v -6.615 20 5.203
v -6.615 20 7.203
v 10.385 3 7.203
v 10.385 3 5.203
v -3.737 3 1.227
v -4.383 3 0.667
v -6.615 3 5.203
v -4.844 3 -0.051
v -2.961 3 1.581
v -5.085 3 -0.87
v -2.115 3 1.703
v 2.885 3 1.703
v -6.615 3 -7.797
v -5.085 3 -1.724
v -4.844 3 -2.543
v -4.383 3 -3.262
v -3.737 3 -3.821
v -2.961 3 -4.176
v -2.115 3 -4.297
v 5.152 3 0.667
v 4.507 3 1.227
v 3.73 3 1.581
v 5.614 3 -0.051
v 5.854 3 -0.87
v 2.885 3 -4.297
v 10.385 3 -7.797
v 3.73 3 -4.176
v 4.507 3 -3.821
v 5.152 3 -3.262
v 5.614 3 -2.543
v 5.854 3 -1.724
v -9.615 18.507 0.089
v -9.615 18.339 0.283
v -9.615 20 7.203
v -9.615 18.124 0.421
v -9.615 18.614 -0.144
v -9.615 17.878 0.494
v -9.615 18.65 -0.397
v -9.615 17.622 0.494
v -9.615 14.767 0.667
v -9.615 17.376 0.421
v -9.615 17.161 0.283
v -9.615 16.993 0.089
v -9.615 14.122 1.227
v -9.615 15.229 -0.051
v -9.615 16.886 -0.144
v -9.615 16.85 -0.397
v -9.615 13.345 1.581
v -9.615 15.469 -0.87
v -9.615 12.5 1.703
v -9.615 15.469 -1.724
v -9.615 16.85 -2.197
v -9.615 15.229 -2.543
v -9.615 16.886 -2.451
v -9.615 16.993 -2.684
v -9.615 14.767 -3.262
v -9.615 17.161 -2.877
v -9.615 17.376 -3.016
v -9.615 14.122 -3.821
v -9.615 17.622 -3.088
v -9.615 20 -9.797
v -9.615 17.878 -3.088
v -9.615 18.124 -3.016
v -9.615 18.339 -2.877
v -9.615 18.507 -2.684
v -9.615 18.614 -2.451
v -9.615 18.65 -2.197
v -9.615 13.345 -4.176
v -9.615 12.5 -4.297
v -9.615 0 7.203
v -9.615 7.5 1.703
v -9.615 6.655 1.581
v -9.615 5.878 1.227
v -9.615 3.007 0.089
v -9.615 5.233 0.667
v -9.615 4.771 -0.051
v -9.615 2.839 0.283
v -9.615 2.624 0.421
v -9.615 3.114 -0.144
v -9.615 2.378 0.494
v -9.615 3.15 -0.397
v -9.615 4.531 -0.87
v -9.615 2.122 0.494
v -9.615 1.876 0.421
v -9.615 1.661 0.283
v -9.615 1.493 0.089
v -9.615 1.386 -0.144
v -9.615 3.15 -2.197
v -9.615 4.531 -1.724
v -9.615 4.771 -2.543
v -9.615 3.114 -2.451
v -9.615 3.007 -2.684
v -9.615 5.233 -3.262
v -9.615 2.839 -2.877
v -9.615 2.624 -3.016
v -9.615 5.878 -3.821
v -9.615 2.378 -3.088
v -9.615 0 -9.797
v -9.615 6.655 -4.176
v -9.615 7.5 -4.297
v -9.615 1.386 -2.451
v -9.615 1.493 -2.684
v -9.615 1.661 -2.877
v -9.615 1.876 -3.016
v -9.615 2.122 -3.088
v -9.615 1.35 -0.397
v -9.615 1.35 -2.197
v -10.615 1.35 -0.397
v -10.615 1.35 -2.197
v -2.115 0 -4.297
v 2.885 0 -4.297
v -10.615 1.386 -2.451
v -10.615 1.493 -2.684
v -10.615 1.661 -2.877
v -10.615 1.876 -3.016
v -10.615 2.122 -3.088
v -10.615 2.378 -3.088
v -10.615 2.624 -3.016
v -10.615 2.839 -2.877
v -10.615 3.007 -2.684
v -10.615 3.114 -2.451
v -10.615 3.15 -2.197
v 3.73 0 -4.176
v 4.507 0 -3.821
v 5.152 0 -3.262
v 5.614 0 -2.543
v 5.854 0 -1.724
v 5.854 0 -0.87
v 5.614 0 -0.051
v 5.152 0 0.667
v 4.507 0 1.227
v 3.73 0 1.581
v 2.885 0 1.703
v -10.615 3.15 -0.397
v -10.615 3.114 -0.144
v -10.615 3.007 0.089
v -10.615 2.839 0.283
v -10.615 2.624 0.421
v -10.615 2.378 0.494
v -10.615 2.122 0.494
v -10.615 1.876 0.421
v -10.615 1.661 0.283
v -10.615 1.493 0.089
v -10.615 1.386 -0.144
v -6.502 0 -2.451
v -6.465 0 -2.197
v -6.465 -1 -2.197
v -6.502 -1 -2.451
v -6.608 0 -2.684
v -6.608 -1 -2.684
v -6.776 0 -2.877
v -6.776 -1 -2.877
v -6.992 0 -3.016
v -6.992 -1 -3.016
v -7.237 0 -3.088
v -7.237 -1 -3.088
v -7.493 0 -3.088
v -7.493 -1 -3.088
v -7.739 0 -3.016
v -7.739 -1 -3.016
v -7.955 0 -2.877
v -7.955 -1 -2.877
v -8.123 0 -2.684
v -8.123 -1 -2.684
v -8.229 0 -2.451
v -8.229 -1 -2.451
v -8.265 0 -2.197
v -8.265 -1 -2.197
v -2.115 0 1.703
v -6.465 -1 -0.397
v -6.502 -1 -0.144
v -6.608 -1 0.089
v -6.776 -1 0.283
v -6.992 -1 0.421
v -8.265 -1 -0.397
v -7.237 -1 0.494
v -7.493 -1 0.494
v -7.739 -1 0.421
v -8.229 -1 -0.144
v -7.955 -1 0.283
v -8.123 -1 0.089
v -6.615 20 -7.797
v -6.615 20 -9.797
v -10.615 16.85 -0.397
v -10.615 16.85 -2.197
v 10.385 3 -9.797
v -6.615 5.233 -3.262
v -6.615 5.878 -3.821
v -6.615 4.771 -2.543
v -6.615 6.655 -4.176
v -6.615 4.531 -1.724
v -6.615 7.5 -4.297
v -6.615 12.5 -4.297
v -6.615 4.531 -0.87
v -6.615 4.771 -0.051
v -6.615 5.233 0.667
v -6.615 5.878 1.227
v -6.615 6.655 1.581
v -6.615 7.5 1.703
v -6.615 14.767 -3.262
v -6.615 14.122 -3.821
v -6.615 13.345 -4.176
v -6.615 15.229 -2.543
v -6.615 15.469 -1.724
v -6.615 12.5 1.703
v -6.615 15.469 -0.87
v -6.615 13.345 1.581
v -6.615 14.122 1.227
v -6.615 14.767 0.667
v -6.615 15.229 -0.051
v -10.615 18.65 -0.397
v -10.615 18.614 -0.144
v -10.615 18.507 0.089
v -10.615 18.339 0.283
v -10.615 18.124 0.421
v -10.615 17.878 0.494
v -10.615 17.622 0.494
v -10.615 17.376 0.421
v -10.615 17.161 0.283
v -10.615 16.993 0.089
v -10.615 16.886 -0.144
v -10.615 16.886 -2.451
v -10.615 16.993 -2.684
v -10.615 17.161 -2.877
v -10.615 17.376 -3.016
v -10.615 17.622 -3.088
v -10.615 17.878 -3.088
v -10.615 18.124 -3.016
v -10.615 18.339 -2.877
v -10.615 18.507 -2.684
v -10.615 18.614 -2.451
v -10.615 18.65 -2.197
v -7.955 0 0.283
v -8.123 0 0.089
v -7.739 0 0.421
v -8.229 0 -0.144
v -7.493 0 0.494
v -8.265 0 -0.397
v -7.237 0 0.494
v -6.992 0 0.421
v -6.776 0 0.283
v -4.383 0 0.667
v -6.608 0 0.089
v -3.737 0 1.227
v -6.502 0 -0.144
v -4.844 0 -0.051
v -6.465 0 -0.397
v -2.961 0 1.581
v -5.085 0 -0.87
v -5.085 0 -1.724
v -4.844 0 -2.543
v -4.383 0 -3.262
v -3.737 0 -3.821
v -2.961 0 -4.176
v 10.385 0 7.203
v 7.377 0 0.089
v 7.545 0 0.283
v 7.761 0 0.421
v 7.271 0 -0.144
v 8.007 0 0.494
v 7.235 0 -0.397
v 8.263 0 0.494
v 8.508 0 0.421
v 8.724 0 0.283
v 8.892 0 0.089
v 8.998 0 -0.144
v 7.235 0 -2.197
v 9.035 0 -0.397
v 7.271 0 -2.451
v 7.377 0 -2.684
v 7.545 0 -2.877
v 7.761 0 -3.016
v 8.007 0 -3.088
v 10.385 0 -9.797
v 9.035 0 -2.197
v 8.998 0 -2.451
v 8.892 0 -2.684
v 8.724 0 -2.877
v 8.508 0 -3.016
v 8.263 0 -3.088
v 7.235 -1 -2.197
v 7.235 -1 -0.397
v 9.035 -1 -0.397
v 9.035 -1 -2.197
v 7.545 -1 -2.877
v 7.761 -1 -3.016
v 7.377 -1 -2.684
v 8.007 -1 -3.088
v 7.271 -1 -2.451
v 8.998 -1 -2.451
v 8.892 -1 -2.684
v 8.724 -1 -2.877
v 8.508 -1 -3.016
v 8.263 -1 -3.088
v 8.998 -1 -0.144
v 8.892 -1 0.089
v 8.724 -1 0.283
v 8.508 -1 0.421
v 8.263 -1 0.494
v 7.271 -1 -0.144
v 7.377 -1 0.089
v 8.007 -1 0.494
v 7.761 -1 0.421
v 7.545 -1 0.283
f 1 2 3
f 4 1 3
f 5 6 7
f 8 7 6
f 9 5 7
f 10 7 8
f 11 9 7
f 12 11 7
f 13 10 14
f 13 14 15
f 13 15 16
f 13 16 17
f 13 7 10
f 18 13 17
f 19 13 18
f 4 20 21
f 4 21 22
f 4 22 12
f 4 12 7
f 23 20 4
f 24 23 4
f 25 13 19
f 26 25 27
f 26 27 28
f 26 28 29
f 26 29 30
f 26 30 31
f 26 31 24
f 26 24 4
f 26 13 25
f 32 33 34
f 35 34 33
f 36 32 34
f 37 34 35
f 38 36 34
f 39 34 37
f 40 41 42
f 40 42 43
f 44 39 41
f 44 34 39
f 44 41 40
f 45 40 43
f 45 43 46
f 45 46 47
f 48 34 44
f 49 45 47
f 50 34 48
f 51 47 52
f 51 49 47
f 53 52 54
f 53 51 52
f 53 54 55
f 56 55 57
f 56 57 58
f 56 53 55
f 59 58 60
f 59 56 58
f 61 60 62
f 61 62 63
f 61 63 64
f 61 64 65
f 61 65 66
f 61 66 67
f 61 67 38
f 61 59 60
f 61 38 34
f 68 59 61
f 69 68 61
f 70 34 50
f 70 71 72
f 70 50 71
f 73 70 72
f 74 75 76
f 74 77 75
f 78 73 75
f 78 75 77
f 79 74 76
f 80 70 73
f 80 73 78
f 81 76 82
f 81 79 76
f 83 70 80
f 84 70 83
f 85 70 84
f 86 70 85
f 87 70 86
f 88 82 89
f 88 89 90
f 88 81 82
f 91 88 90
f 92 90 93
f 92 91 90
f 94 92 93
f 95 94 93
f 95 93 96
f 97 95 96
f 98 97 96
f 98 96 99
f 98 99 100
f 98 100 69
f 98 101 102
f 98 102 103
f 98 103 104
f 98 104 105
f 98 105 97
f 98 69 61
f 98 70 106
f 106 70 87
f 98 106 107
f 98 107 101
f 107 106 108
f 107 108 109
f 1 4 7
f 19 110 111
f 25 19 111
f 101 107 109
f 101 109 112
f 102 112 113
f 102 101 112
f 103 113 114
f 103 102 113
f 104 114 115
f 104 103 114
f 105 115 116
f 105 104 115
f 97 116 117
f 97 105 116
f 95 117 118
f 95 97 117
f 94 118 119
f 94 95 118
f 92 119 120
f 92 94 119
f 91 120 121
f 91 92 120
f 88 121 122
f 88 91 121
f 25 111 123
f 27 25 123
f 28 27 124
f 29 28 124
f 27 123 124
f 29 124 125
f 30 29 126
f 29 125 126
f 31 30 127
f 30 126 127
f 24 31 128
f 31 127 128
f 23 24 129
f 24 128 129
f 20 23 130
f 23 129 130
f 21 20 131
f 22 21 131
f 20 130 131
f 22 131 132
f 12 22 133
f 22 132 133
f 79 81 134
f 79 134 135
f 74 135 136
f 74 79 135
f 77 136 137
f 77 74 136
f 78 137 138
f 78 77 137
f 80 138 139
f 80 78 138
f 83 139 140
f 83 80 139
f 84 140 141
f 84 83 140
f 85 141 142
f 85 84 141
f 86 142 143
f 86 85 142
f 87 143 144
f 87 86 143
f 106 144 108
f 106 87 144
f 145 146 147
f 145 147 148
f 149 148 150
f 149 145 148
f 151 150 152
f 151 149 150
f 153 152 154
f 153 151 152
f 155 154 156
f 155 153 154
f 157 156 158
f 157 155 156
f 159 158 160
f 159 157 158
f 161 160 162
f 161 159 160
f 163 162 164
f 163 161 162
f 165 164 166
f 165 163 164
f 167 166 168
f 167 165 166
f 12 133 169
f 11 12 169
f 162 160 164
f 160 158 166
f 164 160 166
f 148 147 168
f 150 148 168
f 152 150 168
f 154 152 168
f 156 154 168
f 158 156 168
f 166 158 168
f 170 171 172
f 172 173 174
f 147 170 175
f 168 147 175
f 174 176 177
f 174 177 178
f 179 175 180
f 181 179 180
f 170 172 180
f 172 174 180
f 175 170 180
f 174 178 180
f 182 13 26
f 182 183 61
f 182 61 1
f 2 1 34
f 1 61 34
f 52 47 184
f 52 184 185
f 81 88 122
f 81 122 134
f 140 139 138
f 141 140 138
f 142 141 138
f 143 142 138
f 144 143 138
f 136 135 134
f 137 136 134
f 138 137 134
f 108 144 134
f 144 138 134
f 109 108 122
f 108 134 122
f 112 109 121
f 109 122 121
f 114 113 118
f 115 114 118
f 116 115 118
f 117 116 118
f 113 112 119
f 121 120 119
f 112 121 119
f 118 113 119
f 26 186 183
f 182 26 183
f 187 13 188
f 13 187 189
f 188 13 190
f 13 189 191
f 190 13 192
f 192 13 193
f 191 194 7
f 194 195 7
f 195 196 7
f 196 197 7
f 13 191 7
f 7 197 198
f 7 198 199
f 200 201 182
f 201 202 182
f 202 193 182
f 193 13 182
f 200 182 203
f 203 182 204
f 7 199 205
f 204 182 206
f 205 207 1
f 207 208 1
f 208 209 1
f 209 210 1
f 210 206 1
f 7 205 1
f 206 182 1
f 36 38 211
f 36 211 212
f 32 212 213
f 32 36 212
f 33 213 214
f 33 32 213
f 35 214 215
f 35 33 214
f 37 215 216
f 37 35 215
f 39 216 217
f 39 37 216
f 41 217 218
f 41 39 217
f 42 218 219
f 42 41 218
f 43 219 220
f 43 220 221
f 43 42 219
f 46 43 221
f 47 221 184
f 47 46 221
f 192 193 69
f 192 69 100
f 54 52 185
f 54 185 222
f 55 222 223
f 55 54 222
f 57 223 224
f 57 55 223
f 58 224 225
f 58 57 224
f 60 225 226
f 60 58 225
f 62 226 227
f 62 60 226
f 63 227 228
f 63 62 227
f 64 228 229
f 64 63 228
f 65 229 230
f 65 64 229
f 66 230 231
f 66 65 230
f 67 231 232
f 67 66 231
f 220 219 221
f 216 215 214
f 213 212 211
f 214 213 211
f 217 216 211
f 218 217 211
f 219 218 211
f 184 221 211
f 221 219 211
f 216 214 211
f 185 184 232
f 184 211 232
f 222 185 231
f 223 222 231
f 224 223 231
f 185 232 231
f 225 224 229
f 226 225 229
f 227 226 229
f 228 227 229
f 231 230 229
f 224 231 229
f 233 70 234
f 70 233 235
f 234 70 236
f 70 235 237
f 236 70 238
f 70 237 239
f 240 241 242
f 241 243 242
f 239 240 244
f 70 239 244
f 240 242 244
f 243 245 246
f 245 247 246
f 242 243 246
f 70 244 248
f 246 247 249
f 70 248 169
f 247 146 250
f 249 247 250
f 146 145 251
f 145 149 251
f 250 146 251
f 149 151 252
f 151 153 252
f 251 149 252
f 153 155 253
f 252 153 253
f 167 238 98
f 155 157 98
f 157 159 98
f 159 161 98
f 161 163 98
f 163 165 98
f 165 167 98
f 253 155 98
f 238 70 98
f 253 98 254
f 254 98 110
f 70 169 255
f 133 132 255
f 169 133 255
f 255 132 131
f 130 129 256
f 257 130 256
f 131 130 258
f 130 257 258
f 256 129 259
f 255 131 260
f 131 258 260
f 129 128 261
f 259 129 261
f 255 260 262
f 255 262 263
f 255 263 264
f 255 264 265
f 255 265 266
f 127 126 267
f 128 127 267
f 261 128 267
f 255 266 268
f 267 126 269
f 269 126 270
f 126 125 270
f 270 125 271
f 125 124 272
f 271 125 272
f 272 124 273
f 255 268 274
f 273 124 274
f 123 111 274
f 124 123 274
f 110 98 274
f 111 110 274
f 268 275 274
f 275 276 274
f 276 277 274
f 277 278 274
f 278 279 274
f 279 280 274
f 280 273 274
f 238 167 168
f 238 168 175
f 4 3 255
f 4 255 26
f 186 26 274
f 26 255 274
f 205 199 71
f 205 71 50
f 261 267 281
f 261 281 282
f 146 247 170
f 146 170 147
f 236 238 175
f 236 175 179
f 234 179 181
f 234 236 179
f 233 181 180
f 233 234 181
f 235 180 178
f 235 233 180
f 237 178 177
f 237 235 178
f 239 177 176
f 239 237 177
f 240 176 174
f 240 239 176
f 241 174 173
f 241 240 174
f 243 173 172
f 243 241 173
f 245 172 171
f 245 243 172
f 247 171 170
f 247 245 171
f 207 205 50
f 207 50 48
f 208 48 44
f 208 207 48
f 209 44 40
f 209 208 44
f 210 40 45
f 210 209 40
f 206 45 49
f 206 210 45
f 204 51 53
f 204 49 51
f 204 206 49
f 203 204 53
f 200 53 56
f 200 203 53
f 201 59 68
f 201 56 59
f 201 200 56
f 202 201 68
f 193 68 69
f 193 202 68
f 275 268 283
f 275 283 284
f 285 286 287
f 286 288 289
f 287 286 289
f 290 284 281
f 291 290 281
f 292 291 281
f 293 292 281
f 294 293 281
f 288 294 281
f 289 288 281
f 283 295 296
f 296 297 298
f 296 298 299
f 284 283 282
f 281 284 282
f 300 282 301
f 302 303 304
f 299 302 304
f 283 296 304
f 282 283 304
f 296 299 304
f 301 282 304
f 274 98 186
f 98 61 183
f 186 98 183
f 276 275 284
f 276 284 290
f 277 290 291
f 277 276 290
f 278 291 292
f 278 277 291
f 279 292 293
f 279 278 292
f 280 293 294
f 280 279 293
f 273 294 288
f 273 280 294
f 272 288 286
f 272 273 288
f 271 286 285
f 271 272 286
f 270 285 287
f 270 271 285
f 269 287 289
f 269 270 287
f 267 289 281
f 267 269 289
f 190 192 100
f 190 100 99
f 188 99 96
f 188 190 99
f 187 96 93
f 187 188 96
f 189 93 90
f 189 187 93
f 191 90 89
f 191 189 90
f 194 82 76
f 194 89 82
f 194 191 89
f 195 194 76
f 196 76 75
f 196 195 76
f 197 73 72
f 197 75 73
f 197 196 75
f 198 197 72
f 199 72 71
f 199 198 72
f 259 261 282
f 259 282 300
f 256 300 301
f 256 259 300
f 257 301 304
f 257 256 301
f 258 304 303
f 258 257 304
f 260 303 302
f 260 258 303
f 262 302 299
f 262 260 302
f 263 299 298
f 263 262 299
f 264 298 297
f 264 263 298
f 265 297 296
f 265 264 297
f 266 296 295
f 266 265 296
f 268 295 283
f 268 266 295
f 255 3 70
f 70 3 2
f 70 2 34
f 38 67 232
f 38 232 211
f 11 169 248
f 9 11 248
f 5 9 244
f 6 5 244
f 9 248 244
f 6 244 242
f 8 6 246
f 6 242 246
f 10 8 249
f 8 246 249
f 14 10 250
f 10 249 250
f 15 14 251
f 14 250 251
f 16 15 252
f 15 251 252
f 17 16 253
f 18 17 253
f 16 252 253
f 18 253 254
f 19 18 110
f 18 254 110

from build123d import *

# Parameters (mm, degrees)
SKETCH_1_W          = 20
SKETCH_1_H          = 17
EXTRUDE_1_DEPTH     = 3
SKETCH_4_W          = 17
SKETCH_4_H          = 20
EXTRUDE_2_DEPTH     = 3
EXTRUDE_3_DEPTH     = 2
EXTRUDE_4_DEPTH     = 2
CUT_EXTRUDE_2_DEPTH = 12
EXTRUDE_6_DEPTH     = 1
EXTRUDE_7_DEPTH     = 1


with BuildPart() as part:
    # 草图1 → 凸台-拉伸1 (new body)
    with BuildSketch(Plane(origin=(0, 0, 0), x_dir=(1, 0, 0), z_dir=(0, 1, 0))):
        with Locations((0.384615385, 1.297202797)):
            Rectangle(SKETCH_1_W, SKETCH_1_H)
        with BuildLine():
            Line((-2.115384615, 4.297202797), (2.884615385, 4.297202797))
            ThreePointArc((2.884615385, 4.297202797), (5.884615385, 1.297202797), (2.884615385, -1.702797203))
            Line((2.884615385, -1.702797203), (-2.115384615, -1.702797203))
            ThreePointArc((-2.115384615, -1.702797203), (-5.115384615, 1.297202797), (-2.115384615, 4.297202797))
        make_face(mode=Mode.SUBTRACT)
    extrude(amount=EXTRUDE_1_DEPTH)

    # 草图4 → 凸台-拉伸2 (add)
    with BuildSketch(Plane.ZY.offset(9.615384615)):
        with Locations((-1.297202797, 10)):
            Rectangle(SKETCH_4_W, SKETCH_4_H)
    extrude(amount=-EXTRUDE_2_DEPTH)

    # 草图6 → 凸台-拉伸3 (add)
    with BuildSketch(Plane.XY.offset(7.202797203)):
        Polygon((-6.615384615, 20), (10.384615385, 3), (-6.615384615, 3), align=None)
    extrude(amount=-EXTRUDE_3_DEPTH)

    # 草图7 → 凸台-拉伸4 (add)
    with BuildSketch(Plane(origin=(0, 0, -9.797202797), x_dir=(-1, 0, 0), z_dir=(0, 0, -1))):
        Polygon((6.615384615, 20), (6.615384615, 3), (-10.384615385, 3), align=None)
    extrude(amount=-EXTRUDE_4_DEPTH)

    # 草图5 → 切除-拉伸2 (cut)
    with BuildSketch(Plane(origin=(-6.615384615, 0, 0), x_dir=(0, 0, -1), z_dir=(1, 0, 0))):
        with BuildLine():
            Line((4.297202797, 12.5), (4.297202797, 7.5))
            ThreePointArc((4.297202797, 7.5), (1.297202797, 4.5), (-1.702797203, 7.5))
            Line((-1.702797203, 7.5), (-1.702797203, 12.5))
            ThreePointArc((-1.702797203, 12.5), (1.297202797, 15.5), (4.297202797, 12.5))
        make_face()
    extrude(amount=-CUT_EXTRUDE_2_DEPTH, mode=Mode.SUBTRACT)

    # 草图9 → 凸台-拉伸6 (add)
    with BuildSketch(Plane.ZY.offset(9.615384615)):
        with BuildLine():
            Line((-2.197202797, 18.65), (-0.397202797, 18.65))
            ThreePointArc((-0.397202797, 18.65), (0.502797203, 17.75), (-0.397202797, 16.85))
            Line((-0.397202797, 16.85), (-2.197202797, 16.85))
            ThreePointArc((-2.197202797, 16.85), (-3.097202797, 17.75), (-2.197202797, 18.65))
        make_face()
        with BuildLine():
            Line((-2.197202797, 3.15), (-0.397202797, 3.15))
            ThreePointArc((-0.397202797, 3.15), (0.502797203, 2.25), (-0.397202797, 1.35))
            Line((-0.397202797, 1.35), (-2.197202797, 1.35))
            ThreePointArc((-2.197202797, 1.35), (-3.097202797, 2.25), (-2.197202797, 3.15))
        make_face()
    extrude(amount=EXTRUDE_6_DEPTH)

    # 草图10 → 凸台-拉伸7 (add)
    with BuildSketch(Plane.XZ):
        with BuildLine():
            Line((-6.465384615, -0.397202797), (-6.465384615, -2.197202797))
            ThreePointArc((-6.465384615, -2.197202797), (-7.365384615, -3.097202797), (-8.265384615, -2.197202797))
            Line((-8.265384615, -2.197202797), (-8.265384615, -0.397202797))
            ThreePointArc((-8.265384615, -0.397202797), (-7.365384615, 0.502797203), (-6.465384615, -0.397202797))
        make_face()
        with BuildLine():
            Line((9.034615385, -0.397202797), (9.034615385, -2.197202797))
            ThreePointArc((9.034615385, -2.197202797), (8.134615385, -3.097202797), (7.234615385, -2.197202797))
            Line((7.234615385, -2.197202797), (7.234615385, -0.397202797))
            ThreePointArc((7.234615385, -0.397202797), (8.134615385, 0.502797203), (9.034615385, -0.397202797))
        make_face()
    extrude(amount=EXTRUDE_7_DEPTH)


solid = part.part
